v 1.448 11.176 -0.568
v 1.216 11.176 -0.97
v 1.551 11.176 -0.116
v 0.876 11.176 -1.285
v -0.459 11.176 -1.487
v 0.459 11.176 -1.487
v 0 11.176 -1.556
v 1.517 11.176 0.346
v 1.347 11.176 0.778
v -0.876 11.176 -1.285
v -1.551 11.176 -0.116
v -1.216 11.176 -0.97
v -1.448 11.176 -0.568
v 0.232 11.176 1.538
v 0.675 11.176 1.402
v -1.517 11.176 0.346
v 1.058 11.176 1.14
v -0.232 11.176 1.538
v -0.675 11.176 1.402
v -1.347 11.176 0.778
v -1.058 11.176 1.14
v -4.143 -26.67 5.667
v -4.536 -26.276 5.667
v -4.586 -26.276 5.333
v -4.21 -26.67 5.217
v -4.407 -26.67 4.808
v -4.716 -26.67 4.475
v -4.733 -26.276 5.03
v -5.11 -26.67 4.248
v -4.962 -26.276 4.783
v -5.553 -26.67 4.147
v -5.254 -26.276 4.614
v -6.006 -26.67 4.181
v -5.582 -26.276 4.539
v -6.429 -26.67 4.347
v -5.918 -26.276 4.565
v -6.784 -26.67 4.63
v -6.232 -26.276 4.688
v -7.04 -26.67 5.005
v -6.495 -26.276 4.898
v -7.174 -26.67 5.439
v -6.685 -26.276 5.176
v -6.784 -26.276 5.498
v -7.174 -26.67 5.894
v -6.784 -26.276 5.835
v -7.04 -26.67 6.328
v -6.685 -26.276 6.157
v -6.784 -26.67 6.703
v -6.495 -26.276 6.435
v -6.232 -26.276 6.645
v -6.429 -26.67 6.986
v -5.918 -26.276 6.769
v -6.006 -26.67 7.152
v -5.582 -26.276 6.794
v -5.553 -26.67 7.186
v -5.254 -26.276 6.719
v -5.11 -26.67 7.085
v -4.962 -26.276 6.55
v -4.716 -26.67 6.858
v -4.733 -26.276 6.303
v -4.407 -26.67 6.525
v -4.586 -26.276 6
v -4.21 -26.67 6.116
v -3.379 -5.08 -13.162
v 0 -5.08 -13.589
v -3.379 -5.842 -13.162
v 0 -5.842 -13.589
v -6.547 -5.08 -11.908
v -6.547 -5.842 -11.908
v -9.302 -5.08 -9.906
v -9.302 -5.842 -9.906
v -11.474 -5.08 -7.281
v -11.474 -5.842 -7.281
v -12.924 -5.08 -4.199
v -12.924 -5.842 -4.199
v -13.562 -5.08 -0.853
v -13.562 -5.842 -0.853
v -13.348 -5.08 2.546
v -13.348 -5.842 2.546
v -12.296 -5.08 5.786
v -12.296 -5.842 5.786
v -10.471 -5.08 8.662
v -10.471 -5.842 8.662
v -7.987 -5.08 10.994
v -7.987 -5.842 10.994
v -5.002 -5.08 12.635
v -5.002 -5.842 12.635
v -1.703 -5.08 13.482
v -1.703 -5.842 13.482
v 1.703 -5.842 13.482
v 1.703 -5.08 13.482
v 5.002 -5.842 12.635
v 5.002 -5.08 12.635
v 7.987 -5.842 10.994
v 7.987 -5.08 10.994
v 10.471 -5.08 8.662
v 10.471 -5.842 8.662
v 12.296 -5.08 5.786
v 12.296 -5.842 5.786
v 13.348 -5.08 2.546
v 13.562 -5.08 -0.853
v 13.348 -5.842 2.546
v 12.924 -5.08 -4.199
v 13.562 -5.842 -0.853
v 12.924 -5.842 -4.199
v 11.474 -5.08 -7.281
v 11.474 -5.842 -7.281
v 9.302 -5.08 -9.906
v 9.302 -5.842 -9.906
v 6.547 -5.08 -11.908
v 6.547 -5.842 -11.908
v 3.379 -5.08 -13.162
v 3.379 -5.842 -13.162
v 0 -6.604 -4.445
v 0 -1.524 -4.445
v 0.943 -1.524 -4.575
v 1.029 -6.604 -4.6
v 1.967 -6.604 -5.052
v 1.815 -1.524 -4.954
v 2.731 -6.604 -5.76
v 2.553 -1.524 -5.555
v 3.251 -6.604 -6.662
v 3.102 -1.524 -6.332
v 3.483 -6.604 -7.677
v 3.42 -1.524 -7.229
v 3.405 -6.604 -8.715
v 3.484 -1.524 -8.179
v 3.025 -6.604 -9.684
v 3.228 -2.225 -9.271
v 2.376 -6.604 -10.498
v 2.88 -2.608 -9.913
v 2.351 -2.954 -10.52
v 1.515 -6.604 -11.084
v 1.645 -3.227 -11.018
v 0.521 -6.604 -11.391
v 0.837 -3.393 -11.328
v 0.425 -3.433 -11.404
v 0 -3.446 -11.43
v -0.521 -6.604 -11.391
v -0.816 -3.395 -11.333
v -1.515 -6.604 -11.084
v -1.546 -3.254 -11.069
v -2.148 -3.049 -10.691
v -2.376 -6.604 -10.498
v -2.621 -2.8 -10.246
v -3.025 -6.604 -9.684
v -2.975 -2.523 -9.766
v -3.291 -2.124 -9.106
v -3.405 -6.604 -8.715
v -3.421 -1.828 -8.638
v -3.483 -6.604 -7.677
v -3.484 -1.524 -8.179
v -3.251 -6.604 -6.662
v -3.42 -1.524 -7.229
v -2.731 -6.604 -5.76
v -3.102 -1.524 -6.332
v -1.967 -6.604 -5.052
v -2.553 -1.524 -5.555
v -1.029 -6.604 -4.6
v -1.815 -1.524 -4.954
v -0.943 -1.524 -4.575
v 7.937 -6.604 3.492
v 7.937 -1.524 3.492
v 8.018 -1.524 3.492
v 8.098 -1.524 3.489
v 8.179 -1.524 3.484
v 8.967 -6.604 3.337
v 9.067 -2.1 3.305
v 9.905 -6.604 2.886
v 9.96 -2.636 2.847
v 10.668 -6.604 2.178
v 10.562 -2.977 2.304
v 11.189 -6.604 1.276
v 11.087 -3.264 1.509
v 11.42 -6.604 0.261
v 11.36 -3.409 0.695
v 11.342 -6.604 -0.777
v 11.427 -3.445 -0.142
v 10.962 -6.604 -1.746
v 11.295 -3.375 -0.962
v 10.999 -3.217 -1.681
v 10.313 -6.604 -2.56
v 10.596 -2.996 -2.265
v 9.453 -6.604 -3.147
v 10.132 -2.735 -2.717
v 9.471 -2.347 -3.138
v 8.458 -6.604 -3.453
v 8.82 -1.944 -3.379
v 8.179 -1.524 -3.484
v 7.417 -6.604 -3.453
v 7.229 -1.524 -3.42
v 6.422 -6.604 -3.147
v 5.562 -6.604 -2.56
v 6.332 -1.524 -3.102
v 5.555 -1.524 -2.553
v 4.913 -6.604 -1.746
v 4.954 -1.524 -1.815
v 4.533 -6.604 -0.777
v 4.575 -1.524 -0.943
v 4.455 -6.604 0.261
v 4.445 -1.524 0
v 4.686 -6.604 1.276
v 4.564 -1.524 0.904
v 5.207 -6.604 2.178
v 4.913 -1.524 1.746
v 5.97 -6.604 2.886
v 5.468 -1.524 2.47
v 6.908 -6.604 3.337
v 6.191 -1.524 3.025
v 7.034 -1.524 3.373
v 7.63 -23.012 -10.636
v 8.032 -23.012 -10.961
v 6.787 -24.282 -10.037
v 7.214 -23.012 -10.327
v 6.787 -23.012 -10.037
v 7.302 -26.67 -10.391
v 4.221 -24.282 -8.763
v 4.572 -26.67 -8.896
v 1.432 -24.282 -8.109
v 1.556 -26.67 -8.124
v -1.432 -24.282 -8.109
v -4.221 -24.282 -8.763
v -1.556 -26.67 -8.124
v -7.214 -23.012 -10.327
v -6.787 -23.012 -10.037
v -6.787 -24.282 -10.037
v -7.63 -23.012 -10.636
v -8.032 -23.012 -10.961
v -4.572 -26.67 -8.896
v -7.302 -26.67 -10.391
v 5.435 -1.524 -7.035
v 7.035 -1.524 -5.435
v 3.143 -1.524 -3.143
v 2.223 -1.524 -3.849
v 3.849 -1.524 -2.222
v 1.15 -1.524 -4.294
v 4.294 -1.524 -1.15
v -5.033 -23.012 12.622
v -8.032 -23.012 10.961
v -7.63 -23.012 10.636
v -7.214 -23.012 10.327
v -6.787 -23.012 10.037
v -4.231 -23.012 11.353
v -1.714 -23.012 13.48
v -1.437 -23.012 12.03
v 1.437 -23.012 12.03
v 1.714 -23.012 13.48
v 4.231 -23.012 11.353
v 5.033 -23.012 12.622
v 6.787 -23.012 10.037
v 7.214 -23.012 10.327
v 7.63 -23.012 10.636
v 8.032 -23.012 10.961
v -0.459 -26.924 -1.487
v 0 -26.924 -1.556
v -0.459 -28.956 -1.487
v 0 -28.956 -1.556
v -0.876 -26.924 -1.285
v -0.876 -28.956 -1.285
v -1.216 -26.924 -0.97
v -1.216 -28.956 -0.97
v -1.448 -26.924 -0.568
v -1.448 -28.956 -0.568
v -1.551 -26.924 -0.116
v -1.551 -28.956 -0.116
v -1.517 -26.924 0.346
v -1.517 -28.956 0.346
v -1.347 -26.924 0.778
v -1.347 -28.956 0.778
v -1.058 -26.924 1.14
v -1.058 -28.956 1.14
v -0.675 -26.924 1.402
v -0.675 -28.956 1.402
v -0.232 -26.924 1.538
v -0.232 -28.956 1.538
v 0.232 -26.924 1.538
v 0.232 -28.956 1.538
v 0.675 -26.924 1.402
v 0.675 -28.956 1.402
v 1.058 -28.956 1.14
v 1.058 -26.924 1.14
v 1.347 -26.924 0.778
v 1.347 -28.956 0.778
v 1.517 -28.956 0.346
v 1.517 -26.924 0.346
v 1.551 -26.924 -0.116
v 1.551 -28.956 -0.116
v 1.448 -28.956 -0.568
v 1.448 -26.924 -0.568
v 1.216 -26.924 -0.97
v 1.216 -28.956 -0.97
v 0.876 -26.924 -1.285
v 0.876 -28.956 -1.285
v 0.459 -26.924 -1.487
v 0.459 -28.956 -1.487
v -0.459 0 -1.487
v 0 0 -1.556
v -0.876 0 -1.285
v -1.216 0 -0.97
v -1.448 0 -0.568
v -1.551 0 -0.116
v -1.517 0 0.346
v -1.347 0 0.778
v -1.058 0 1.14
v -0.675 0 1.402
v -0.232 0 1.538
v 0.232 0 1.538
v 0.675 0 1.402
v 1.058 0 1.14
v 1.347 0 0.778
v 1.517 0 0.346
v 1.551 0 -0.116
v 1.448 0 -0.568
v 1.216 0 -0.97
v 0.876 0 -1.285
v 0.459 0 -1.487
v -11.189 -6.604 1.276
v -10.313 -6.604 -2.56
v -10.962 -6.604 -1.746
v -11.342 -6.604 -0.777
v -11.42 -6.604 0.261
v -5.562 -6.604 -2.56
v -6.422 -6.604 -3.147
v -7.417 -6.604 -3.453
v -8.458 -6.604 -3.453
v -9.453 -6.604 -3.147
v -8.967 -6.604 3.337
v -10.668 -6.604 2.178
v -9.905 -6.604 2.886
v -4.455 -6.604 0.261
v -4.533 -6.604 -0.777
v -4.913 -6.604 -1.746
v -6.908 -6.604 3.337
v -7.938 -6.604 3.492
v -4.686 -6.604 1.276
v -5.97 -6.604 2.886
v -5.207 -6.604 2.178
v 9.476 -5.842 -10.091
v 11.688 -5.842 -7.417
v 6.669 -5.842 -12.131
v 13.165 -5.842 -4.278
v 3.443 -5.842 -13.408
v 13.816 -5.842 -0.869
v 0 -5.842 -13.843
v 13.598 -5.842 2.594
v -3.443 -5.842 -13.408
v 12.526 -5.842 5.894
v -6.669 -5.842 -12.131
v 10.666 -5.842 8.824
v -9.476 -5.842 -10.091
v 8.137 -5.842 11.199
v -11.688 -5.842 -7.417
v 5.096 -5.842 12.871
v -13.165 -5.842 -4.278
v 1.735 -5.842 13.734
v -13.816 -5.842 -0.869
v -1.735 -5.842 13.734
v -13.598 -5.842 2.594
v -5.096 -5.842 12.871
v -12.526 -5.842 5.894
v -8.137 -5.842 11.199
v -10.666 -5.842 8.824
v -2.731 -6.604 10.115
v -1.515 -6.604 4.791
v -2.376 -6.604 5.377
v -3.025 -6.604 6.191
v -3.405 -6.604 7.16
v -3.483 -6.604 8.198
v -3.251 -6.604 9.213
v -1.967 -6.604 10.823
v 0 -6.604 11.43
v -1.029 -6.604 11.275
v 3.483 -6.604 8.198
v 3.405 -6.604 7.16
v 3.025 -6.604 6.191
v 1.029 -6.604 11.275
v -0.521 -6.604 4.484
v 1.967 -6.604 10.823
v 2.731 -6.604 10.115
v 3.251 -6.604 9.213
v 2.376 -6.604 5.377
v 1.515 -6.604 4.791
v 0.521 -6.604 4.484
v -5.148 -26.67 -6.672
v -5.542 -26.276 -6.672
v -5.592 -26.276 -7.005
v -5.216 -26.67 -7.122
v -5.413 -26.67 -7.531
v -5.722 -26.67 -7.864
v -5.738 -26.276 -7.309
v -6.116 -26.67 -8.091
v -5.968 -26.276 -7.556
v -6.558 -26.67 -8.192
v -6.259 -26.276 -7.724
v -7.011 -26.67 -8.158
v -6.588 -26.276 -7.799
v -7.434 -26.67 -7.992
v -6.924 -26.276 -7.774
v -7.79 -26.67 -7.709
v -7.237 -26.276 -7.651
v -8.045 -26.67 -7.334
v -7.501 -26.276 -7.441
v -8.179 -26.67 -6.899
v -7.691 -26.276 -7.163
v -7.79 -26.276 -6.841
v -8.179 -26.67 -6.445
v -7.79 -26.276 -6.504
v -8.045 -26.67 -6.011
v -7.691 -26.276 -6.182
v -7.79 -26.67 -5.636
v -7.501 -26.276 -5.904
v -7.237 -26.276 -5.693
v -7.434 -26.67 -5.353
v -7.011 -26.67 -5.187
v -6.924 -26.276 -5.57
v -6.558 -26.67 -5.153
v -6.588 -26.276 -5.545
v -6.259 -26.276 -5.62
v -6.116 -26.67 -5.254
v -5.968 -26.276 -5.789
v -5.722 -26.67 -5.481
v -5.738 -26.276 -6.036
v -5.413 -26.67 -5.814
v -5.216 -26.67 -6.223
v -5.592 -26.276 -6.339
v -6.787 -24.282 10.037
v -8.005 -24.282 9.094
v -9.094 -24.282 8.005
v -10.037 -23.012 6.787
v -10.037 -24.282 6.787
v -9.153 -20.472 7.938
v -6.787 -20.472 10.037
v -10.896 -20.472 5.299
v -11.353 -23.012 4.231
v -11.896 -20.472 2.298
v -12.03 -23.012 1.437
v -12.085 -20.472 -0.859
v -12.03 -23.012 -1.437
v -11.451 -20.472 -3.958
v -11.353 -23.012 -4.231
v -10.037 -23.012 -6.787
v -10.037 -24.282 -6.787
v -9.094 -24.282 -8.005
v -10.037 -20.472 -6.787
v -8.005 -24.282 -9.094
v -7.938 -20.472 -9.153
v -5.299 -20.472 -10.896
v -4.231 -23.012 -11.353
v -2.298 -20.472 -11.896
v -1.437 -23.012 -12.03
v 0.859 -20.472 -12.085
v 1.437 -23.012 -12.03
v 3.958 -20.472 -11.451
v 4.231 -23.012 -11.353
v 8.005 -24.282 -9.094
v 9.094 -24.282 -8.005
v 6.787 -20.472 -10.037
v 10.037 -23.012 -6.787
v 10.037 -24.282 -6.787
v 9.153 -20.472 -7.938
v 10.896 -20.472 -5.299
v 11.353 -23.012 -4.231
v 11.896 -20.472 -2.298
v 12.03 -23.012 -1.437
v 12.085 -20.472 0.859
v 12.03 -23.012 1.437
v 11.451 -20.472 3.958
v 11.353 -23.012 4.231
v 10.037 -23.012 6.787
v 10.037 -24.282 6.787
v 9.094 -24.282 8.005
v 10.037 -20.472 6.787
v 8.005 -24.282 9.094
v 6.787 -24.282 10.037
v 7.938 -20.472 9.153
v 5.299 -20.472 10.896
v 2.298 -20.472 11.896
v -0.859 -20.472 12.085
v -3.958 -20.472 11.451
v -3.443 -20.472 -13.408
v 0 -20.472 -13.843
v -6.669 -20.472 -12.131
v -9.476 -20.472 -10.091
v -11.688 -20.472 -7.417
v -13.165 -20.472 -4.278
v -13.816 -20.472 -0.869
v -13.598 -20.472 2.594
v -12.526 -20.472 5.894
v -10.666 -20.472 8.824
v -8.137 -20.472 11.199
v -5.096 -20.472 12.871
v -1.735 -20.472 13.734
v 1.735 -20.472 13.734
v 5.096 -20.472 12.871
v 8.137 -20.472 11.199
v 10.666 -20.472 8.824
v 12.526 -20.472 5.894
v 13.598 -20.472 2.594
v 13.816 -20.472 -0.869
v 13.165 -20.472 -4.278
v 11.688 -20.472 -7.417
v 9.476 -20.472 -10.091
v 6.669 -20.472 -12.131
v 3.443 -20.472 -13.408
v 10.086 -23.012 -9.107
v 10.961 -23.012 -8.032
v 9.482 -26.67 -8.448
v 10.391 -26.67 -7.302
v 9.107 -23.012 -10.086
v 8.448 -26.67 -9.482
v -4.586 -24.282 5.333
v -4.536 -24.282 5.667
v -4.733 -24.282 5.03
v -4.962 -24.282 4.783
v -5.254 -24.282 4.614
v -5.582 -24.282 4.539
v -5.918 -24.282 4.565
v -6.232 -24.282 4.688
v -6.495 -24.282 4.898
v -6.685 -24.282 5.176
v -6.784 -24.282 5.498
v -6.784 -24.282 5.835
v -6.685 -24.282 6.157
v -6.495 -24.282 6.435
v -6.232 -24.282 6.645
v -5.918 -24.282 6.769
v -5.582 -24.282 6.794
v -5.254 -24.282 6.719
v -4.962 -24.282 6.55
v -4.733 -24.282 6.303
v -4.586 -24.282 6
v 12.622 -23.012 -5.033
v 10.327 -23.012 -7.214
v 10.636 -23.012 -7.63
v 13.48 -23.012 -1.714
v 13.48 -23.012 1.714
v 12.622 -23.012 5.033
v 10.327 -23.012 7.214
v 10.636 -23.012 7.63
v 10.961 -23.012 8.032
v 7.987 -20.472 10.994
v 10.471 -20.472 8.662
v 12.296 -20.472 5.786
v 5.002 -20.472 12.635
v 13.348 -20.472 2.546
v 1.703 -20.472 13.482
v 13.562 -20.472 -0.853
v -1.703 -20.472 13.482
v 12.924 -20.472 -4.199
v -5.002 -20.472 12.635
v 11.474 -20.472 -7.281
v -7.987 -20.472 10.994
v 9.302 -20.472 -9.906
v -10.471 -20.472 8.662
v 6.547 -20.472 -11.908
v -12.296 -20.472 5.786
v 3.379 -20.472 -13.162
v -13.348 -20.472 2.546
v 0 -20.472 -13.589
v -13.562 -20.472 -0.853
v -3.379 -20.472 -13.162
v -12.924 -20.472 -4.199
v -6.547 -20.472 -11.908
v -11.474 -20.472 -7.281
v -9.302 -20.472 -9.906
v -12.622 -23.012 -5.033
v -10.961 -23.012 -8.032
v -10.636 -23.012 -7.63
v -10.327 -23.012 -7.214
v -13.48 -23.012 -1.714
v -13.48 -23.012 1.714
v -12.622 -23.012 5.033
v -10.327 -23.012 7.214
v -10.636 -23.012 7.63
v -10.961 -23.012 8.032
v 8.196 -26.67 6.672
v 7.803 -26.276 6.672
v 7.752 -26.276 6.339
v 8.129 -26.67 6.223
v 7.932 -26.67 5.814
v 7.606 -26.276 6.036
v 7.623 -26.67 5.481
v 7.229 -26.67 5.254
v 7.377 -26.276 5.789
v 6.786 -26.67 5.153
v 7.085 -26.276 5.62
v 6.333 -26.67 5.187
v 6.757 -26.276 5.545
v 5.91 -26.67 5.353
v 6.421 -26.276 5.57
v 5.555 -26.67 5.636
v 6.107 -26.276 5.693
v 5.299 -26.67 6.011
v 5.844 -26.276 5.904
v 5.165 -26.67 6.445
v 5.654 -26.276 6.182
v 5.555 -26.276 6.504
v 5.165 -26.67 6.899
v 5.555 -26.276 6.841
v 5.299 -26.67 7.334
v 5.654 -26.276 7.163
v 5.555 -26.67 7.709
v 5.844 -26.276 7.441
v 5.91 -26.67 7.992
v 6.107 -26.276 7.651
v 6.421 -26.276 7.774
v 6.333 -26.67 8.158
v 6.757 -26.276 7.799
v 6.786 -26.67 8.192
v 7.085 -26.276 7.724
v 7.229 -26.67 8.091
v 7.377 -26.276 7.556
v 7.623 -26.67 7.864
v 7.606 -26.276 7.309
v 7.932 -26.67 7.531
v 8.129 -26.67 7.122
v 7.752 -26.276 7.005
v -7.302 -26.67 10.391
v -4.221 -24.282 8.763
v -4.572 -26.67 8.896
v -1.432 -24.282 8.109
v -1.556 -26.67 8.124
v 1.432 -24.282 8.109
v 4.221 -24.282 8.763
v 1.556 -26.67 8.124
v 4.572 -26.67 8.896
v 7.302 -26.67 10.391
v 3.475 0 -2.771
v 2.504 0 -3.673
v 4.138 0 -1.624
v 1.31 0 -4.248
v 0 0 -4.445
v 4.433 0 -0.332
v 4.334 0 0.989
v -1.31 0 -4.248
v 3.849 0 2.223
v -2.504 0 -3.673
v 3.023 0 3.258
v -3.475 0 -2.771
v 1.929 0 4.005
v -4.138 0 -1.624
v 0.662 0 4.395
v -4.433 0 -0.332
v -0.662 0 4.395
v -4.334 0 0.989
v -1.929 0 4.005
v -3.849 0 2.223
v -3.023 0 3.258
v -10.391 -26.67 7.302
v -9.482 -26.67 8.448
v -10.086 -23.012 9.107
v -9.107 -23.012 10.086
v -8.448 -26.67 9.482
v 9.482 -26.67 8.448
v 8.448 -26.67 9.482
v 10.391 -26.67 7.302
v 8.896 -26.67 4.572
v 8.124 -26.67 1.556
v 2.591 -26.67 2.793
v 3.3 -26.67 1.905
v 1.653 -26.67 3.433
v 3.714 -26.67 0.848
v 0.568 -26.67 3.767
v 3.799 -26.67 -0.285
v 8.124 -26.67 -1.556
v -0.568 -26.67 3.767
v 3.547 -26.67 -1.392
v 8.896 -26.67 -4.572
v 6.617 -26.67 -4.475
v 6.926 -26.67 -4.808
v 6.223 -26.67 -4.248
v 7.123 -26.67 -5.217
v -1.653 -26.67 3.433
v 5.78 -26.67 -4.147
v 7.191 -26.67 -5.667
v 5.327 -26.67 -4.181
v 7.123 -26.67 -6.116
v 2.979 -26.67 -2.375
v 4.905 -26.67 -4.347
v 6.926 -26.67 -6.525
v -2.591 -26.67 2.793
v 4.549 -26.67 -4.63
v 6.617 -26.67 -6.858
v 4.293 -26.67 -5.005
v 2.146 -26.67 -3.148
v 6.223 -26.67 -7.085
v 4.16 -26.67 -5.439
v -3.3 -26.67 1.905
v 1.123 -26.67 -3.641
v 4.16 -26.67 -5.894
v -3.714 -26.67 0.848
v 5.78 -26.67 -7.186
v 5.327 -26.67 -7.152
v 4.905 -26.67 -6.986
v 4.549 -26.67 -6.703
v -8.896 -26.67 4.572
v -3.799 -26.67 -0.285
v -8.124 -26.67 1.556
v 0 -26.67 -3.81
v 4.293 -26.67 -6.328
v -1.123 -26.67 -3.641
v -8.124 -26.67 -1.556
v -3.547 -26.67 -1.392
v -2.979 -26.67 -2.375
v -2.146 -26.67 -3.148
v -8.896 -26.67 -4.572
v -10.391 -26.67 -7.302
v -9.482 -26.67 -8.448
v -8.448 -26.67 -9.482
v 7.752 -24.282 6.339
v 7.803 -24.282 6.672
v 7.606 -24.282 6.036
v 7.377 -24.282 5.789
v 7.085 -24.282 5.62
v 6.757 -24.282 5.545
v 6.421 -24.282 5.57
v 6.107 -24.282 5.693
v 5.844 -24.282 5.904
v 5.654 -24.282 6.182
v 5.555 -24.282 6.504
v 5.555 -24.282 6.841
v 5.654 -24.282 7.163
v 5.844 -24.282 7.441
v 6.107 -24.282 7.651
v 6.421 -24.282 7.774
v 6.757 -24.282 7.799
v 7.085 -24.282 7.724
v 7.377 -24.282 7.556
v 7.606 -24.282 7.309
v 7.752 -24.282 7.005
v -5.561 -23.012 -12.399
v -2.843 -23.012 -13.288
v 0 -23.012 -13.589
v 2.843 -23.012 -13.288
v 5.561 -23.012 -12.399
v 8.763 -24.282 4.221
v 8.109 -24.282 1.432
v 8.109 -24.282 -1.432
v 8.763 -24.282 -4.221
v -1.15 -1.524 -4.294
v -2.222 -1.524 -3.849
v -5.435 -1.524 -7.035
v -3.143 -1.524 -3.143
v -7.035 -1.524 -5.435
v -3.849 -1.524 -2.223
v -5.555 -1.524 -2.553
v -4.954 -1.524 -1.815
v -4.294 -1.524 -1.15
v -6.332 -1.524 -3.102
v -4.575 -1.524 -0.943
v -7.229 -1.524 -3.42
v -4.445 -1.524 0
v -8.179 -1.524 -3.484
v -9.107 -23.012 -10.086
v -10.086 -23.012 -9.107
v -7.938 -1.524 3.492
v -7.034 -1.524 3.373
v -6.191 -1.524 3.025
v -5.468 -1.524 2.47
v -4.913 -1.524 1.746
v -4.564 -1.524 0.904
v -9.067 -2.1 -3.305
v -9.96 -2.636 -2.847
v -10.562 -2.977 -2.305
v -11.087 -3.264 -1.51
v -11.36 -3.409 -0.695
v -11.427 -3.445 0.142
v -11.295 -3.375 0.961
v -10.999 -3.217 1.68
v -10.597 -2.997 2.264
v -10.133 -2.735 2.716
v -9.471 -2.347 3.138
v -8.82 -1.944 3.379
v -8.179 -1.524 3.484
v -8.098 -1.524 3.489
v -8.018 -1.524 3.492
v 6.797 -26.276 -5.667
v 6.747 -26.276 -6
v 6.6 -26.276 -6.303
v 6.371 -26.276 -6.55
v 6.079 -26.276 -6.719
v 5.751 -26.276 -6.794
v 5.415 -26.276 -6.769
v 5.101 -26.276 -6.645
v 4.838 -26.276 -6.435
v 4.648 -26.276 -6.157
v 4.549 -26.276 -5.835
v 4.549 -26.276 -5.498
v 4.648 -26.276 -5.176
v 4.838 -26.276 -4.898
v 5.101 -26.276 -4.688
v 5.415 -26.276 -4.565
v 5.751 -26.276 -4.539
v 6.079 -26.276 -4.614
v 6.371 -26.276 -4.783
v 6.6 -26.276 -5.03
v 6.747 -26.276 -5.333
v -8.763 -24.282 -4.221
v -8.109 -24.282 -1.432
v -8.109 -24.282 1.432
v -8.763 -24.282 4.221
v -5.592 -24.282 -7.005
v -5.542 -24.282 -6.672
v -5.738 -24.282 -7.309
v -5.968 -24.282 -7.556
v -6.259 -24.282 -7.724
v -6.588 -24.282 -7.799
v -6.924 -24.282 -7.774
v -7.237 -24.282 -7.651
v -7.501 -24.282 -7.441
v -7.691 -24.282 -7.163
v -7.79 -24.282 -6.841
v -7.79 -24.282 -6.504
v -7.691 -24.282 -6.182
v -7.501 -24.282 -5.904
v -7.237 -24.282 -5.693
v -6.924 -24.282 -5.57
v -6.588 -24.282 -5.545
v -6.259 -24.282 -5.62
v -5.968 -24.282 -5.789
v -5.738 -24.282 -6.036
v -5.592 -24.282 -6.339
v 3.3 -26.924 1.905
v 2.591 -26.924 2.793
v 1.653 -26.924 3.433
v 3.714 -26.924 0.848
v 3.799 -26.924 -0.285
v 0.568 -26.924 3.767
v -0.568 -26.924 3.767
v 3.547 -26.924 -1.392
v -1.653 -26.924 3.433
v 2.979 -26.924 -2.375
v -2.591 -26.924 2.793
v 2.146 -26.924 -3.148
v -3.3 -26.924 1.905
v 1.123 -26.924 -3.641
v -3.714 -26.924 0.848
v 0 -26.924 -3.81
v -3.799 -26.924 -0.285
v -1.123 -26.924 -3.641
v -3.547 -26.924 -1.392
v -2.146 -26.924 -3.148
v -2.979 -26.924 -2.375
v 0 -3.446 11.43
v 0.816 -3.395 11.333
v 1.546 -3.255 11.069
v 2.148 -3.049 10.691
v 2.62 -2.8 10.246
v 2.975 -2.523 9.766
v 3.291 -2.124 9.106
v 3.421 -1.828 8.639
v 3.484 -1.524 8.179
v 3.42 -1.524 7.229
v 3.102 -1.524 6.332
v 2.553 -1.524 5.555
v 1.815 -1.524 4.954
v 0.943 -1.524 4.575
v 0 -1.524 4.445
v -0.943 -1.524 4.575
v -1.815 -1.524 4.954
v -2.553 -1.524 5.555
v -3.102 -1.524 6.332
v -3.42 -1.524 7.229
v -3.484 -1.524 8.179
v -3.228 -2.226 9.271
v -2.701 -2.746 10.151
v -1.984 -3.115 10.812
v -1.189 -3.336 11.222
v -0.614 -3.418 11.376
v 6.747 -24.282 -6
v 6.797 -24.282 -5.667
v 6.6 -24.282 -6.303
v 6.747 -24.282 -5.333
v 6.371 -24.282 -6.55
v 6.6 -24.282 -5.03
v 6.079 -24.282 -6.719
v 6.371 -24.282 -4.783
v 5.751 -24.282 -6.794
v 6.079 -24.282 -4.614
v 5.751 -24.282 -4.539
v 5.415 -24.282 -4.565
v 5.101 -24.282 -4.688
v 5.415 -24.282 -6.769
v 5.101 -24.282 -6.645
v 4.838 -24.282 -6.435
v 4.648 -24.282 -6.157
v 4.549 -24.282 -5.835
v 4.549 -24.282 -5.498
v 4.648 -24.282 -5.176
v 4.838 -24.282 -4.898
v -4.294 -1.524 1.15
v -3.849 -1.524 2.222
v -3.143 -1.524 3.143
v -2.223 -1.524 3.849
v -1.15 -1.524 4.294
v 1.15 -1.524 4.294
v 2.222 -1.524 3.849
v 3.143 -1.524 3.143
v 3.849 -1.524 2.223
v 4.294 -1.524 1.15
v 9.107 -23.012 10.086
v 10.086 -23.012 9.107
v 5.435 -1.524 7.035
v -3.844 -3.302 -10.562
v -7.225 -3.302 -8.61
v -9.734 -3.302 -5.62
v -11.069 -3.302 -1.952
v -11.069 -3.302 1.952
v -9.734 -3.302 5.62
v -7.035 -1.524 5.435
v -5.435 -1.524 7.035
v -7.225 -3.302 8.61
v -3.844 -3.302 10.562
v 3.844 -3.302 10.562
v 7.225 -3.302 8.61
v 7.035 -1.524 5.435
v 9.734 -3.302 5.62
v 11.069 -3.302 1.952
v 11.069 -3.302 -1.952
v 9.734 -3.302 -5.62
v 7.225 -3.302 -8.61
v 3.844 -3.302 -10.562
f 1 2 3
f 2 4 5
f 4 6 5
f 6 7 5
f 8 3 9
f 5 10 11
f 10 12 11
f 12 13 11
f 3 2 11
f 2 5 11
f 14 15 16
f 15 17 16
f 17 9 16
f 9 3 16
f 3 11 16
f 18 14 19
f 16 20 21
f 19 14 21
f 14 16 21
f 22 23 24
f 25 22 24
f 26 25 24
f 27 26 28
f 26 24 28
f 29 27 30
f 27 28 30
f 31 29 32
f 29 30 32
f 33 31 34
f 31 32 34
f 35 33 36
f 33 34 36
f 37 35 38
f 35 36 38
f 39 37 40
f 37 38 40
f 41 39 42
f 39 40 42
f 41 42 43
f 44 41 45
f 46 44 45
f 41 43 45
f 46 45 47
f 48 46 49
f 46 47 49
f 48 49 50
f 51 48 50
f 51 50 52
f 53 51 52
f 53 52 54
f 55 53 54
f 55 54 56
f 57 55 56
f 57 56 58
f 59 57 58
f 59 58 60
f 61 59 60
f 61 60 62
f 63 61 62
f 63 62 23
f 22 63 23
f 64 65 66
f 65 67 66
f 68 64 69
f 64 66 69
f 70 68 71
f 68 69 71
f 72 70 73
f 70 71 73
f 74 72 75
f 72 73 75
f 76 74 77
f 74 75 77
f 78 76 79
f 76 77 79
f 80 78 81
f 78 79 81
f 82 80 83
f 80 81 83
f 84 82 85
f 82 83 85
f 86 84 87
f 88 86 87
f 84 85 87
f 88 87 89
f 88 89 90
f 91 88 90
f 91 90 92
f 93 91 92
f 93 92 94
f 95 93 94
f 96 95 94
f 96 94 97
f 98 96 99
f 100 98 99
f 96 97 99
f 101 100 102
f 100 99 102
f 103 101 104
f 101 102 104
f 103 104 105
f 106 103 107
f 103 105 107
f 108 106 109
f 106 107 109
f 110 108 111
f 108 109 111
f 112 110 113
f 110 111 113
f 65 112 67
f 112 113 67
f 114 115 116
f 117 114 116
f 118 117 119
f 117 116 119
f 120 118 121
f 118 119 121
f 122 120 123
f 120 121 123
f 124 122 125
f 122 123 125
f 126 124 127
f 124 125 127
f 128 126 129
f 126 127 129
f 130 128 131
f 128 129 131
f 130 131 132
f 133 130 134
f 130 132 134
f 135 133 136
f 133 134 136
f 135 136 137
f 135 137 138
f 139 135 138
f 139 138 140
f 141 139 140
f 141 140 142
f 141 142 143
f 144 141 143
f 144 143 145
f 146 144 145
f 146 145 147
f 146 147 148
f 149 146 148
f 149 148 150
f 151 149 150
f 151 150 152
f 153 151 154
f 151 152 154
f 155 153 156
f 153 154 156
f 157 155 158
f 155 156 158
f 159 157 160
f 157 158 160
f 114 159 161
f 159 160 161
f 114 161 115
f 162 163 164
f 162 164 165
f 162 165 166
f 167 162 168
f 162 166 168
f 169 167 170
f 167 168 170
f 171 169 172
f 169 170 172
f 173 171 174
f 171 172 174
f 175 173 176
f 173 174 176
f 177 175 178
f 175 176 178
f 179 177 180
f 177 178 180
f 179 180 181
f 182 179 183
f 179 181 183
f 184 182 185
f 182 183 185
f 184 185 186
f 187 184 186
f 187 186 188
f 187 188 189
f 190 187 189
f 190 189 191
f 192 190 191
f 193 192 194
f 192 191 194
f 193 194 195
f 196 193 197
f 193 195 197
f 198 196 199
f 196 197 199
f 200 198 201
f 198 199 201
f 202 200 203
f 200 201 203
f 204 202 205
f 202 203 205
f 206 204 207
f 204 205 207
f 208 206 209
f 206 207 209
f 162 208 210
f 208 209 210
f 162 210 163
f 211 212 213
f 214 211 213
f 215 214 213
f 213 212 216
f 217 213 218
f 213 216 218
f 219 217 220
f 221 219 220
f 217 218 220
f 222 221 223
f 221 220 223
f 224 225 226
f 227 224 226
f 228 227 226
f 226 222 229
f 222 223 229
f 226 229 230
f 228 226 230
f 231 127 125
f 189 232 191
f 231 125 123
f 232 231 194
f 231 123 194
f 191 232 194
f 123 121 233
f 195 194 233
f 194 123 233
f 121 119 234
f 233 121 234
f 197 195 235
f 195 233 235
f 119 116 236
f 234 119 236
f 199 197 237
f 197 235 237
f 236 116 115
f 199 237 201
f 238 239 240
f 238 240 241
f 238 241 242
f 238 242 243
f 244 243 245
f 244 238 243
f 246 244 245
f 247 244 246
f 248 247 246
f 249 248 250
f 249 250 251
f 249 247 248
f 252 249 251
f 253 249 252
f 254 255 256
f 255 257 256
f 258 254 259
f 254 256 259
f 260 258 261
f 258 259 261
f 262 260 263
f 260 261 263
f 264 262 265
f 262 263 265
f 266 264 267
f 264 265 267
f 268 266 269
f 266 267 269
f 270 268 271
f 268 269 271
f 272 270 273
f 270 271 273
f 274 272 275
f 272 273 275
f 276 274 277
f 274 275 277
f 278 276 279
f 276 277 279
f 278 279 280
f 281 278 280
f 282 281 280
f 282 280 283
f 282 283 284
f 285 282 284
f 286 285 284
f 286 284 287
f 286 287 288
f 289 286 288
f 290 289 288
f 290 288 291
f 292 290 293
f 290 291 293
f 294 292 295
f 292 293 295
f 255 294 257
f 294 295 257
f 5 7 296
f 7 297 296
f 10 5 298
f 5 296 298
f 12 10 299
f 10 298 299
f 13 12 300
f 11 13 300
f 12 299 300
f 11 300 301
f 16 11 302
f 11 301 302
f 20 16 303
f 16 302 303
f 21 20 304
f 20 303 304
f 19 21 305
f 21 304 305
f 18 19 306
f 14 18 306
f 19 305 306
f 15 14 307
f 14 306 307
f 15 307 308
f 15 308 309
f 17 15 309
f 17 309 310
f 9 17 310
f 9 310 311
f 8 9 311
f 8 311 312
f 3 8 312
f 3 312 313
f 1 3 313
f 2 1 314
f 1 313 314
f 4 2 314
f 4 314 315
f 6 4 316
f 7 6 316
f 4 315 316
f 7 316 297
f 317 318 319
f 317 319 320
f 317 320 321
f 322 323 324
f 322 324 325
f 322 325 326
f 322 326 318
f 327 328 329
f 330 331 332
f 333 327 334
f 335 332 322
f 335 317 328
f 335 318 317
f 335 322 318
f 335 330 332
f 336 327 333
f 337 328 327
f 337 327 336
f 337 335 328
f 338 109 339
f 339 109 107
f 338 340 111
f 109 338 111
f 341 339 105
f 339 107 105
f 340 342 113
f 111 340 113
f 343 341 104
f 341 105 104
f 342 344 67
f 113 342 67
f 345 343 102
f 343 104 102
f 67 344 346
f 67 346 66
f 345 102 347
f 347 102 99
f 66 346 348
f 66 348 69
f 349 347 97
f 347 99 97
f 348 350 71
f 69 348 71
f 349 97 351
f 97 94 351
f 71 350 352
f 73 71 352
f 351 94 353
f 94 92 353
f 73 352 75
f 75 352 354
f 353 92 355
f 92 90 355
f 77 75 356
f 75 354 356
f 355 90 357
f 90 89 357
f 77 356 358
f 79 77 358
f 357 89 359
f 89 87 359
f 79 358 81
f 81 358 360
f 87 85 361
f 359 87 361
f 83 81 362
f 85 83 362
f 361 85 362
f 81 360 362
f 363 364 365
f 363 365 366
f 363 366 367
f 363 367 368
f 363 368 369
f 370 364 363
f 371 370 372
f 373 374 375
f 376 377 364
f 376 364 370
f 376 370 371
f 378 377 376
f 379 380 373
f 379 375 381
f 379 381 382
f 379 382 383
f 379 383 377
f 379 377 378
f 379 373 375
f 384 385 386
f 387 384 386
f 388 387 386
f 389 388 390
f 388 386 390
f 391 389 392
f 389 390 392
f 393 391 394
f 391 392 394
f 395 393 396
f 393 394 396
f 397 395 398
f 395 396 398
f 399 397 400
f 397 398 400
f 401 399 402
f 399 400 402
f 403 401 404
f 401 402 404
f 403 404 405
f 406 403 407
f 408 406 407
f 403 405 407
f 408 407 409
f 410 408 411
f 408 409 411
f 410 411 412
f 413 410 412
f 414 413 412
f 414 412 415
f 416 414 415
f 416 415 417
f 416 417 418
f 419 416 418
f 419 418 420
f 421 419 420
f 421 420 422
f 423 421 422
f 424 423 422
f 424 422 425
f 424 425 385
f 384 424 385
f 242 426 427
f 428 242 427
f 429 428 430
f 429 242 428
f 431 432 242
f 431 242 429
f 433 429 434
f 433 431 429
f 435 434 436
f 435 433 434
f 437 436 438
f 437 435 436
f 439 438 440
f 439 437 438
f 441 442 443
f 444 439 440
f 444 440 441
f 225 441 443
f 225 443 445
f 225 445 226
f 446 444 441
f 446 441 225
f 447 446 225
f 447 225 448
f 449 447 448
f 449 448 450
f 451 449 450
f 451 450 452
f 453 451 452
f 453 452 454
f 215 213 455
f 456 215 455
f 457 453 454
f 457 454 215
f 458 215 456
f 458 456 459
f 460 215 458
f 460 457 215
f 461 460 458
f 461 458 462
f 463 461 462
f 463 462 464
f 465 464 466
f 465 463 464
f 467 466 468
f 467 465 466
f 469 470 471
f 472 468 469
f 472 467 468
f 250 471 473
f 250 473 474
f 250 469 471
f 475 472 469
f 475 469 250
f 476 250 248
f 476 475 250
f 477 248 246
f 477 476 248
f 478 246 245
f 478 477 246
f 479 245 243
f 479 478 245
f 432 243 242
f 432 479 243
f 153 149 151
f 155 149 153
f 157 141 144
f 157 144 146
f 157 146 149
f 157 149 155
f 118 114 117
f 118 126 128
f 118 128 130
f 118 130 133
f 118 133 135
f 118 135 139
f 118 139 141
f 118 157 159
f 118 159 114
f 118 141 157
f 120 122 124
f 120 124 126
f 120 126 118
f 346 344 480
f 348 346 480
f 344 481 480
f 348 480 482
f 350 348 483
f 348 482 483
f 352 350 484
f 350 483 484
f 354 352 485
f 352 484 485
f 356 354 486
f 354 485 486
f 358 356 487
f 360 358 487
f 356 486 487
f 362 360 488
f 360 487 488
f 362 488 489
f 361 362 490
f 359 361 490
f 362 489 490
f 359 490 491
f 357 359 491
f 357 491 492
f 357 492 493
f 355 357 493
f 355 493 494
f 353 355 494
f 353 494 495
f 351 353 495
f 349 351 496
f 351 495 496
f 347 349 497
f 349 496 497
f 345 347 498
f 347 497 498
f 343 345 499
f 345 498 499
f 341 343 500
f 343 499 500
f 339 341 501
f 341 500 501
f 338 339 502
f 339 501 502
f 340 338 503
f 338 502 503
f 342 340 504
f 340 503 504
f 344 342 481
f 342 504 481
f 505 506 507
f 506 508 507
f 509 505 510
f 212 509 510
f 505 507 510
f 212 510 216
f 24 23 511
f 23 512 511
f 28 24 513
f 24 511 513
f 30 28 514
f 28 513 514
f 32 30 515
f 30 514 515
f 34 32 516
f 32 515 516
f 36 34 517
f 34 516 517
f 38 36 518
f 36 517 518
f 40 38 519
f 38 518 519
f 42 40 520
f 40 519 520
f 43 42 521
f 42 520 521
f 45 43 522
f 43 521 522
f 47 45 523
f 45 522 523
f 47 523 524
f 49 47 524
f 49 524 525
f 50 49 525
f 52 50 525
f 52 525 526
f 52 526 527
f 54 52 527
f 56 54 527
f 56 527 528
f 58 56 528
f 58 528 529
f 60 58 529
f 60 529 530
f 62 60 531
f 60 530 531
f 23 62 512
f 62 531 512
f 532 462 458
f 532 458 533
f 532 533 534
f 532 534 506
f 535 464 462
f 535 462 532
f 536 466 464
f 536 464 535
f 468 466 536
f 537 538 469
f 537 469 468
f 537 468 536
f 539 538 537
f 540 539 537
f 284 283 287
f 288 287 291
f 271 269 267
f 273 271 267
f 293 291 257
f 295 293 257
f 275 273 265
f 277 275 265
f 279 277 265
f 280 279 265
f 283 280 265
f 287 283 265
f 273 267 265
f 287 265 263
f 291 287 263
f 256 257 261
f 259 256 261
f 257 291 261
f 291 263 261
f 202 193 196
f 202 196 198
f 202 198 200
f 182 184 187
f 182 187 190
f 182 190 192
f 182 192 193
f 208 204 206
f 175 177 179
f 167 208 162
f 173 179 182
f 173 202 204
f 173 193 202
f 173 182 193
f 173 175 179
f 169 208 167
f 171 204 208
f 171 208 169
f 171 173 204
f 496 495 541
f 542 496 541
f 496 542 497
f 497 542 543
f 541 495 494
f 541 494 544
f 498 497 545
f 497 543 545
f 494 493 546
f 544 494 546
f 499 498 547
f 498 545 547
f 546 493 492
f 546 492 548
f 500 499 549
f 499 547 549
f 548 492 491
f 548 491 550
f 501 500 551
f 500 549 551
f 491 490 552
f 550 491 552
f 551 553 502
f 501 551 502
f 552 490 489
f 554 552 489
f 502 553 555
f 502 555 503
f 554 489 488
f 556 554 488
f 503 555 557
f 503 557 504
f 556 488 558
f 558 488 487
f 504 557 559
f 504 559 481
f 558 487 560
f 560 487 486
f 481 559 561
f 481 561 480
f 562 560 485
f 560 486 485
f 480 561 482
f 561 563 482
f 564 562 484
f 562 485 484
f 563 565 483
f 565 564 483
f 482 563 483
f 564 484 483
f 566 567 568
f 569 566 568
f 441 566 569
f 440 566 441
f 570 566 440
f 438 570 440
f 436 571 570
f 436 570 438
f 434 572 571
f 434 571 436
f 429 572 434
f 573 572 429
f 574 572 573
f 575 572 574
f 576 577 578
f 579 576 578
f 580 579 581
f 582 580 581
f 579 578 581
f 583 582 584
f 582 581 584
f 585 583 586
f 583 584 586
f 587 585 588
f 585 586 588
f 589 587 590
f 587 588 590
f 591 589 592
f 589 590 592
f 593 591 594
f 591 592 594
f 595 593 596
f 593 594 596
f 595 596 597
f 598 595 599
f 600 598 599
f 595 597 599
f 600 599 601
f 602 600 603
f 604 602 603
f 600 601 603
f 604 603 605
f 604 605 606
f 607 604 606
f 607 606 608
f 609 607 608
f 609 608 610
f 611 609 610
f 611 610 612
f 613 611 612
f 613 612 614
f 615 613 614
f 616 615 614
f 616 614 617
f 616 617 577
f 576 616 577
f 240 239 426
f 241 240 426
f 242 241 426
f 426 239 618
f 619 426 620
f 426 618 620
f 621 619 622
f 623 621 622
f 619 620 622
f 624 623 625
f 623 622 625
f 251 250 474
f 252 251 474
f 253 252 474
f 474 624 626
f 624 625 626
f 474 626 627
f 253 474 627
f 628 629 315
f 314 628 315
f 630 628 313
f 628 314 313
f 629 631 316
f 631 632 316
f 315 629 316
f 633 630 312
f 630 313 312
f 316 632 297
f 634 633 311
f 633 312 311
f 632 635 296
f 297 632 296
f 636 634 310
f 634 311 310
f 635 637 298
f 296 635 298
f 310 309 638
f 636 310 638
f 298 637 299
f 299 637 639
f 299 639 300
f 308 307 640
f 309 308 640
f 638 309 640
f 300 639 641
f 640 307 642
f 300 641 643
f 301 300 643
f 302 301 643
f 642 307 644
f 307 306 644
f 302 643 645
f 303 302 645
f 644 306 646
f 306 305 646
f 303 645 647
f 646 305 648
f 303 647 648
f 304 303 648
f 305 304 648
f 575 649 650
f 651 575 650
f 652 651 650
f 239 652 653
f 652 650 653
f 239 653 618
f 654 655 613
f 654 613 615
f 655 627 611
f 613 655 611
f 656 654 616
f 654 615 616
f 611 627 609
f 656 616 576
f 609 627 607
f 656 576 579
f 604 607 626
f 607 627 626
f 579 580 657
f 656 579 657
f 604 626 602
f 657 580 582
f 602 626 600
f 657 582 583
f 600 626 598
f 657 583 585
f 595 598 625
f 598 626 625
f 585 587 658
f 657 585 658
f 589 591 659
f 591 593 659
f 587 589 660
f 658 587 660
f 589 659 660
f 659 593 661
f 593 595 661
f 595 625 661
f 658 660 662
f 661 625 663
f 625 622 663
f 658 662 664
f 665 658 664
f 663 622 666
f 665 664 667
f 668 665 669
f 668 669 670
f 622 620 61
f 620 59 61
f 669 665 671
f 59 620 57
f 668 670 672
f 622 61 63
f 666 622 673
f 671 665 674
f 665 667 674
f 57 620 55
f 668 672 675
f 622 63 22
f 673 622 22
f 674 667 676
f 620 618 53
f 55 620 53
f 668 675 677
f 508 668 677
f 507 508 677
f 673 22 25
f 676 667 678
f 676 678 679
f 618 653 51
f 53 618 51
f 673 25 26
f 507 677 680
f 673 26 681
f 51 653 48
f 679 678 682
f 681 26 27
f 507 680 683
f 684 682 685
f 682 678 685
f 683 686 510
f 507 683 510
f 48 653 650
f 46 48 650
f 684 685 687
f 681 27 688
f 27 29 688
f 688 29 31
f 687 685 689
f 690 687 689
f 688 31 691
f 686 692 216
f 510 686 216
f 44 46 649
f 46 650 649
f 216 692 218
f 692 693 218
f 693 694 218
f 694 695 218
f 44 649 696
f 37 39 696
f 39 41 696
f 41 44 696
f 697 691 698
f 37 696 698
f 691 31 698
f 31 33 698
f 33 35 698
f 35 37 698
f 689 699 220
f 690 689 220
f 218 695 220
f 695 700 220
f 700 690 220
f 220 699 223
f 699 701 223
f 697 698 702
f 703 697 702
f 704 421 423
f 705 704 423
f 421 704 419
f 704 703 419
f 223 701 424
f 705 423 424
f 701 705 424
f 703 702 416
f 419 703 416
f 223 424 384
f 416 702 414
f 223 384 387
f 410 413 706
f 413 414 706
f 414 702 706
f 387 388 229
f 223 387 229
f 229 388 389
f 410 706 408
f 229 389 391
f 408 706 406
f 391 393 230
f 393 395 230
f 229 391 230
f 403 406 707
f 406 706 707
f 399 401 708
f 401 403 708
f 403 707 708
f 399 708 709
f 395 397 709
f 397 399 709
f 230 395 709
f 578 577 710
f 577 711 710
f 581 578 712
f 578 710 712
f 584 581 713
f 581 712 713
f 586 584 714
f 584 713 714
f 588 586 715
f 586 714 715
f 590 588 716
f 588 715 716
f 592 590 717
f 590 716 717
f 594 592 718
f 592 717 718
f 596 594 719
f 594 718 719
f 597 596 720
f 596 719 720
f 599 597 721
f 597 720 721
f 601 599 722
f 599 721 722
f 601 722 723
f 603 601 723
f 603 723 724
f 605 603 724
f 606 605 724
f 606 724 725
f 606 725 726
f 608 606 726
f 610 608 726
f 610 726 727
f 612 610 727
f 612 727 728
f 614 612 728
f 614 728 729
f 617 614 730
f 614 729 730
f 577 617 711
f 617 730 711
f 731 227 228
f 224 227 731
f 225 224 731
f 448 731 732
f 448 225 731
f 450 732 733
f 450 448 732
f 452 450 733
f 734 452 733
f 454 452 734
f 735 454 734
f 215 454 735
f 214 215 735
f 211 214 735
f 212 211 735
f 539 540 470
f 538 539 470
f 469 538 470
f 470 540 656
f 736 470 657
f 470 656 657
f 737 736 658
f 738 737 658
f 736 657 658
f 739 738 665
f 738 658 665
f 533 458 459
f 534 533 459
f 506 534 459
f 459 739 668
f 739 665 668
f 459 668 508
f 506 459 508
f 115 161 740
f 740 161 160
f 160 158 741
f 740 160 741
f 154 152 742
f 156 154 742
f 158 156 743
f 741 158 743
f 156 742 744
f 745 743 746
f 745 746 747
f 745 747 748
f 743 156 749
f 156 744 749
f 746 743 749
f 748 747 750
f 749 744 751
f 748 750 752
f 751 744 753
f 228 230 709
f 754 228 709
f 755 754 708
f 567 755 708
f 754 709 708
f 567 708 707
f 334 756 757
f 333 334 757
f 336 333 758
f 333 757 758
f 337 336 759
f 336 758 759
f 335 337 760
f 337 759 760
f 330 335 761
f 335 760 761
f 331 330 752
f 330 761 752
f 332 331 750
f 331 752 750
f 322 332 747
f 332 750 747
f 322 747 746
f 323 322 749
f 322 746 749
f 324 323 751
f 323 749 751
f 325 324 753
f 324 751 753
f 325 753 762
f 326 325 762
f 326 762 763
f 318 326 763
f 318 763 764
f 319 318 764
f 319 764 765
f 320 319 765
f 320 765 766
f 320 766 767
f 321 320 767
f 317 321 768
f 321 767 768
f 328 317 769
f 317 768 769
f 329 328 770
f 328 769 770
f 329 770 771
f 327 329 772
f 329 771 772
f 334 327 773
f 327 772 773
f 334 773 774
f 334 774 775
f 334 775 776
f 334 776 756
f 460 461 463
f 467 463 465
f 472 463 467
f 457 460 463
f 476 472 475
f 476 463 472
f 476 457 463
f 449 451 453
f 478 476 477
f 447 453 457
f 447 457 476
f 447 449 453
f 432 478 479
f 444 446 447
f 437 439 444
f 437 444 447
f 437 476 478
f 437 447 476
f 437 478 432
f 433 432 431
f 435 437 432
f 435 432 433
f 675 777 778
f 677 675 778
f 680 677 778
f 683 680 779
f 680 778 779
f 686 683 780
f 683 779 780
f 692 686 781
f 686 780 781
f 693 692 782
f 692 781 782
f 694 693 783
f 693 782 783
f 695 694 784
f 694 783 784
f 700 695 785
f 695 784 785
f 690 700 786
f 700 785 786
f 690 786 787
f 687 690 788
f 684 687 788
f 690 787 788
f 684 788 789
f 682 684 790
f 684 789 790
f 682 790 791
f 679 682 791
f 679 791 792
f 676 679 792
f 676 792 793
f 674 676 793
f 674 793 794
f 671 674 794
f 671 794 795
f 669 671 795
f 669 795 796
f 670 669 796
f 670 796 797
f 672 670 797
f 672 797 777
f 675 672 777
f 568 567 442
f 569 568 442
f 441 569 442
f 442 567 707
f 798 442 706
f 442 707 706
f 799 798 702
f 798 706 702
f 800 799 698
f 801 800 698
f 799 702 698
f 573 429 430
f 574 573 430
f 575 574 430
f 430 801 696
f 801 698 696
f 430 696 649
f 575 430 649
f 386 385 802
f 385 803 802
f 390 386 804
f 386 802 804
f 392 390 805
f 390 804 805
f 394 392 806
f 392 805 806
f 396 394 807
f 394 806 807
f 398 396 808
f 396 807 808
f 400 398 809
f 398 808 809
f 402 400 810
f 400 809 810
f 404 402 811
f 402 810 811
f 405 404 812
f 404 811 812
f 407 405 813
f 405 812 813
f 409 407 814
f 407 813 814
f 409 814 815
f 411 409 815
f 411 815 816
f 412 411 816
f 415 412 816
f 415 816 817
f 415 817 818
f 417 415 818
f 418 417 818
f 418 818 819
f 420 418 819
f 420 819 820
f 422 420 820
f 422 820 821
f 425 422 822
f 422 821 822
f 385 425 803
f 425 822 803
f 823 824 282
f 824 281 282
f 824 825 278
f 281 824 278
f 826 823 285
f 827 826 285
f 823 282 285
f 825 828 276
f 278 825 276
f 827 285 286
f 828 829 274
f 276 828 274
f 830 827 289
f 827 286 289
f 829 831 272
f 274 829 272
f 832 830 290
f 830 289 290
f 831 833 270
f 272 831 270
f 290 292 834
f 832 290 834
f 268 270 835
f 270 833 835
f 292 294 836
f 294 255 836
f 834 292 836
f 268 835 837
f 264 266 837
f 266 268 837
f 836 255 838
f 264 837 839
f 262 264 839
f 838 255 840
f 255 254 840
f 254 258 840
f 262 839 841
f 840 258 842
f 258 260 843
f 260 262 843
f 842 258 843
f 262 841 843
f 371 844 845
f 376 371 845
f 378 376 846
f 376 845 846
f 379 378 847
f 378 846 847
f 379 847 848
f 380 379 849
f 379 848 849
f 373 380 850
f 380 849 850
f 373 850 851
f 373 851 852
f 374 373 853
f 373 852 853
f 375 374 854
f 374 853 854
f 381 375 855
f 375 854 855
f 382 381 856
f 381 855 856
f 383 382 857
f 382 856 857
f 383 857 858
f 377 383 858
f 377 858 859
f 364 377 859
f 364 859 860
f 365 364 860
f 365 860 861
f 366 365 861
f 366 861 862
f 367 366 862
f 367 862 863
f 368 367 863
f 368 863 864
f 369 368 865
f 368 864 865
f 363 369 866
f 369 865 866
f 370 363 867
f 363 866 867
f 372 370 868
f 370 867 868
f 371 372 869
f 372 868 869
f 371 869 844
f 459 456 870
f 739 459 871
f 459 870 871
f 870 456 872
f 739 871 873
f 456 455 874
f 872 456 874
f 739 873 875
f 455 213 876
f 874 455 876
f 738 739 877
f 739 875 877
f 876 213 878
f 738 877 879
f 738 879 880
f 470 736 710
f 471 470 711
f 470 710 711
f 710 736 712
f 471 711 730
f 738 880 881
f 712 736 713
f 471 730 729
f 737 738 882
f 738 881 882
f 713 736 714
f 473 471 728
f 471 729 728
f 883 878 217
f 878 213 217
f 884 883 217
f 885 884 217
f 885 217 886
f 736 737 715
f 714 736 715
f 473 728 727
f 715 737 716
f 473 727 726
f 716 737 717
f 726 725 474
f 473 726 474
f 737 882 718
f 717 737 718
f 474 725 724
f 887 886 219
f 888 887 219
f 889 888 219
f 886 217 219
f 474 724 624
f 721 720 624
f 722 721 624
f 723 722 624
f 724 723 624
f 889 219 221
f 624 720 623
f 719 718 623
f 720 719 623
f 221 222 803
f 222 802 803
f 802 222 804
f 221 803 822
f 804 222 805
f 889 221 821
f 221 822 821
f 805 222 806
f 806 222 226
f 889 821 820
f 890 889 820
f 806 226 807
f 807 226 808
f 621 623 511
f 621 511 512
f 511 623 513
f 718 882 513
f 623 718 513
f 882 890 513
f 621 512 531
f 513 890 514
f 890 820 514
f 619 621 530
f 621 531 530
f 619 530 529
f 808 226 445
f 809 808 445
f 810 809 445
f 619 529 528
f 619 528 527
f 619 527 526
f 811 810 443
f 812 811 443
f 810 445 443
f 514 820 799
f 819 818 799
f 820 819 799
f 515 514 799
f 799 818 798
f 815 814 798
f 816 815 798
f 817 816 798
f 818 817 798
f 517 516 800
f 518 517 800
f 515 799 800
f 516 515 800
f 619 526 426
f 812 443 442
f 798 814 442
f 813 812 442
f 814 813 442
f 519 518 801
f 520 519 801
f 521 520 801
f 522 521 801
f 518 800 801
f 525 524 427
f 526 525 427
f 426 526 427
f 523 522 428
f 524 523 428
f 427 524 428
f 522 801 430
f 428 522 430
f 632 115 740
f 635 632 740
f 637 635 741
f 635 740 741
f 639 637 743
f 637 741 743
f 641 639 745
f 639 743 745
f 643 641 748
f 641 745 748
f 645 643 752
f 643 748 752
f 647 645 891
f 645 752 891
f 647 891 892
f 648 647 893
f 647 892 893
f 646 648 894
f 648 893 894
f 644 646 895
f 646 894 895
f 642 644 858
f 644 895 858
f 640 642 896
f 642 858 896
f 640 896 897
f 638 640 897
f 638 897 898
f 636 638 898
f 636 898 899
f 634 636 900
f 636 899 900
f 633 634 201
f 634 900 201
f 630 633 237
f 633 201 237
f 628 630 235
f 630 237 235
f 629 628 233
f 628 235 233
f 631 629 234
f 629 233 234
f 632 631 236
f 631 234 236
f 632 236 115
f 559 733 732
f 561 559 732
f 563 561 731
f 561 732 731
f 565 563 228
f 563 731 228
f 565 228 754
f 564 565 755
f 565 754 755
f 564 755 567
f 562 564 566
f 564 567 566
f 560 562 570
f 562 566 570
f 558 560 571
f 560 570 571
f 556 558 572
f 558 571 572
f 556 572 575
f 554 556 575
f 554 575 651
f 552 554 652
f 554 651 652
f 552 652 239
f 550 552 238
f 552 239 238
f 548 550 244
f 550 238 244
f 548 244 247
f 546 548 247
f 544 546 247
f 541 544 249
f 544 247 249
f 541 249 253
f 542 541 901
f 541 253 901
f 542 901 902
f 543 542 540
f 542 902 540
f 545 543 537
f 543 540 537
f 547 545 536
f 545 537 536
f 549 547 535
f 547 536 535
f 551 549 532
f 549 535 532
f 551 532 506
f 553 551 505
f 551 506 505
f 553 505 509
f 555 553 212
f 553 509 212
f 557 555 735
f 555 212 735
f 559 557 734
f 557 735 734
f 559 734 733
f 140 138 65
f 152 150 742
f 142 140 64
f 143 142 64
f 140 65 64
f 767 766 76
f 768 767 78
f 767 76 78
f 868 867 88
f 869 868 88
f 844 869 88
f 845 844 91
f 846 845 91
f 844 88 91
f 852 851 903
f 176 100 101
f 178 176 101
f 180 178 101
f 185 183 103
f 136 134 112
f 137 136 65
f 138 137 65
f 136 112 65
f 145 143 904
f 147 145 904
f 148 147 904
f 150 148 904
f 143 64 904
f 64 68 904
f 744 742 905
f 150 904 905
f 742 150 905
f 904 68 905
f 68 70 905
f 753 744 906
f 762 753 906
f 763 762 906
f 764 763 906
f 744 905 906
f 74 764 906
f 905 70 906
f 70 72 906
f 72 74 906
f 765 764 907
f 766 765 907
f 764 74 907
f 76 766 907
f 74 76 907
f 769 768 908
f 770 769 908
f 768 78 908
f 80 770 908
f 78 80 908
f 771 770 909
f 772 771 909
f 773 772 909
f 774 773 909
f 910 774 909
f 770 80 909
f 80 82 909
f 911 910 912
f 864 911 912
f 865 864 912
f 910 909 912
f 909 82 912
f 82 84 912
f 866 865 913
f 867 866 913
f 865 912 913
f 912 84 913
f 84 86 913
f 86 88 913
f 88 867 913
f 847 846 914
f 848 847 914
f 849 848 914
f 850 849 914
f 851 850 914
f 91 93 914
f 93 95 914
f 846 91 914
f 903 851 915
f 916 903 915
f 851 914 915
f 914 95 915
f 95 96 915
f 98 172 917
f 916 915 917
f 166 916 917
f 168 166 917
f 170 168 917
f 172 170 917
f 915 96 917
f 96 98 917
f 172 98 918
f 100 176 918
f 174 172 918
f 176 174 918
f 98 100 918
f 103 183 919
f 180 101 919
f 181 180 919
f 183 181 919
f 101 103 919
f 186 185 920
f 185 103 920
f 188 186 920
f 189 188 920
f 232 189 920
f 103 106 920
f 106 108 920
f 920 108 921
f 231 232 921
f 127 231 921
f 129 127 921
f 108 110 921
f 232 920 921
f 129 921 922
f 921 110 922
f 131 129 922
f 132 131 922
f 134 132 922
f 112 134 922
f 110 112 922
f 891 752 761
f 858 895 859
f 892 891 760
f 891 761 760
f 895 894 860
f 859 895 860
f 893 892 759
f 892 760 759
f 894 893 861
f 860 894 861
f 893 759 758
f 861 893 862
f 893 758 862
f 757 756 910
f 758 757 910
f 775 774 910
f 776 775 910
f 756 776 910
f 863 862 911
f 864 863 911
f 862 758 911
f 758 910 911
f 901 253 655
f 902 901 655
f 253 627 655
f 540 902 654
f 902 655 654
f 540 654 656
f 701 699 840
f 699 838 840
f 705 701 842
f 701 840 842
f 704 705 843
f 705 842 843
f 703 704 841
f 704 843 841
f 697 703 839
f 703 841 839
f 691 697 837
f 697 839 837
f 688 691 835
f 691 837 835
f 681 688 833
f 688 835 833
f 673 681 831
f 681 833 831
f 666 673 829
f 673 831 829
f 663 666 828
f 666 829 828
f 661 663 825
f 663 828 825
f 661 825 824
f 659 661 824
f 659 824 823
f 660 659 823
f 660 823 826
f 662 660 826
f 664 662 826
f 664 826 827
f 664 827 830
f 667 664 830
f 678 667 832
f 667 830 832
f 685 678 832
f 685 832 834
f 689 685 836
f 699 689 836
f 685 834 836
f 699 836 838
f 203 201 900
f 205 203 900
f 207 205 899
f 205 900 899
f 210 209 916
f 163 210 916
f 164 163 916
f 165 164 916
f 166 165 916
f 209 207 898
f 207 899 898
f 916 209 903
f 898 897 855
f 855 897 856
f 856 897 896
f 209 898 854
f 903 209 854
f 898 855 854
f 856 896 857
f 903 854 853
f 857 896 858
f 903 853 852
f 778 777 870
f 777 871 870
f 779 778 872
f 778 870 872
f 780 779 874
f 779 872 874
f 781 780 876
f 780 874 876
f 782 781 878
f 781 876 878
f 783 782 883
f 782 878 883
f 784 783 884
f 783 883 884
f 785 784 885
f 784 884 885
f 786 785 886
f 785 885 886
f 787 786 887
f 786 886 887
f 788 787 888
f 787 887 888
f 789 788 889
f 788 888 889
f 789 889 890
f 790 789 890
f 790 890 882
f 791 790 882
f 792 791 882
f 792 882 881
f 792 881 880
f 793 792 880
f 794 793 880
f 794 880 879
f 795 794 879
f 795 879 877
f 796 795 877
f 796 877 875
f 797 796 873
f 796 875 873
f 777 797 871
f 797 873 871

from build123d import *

# Parameters (mm, degrees)
SKETCH2_R                       = 3.4925
CUT_EXTRUDE1_DEPTH              = 5.08
SKETCH3_R                       = 12.460238567
CUT_EXTRUDE2_DEPTH              = 3.6576
CUT_EXTRUDE3_DEPTH              = 1.27
CUT_EXTRUDE3_DEPTH_BACK         = 2.54
SKETCH4_R                       = 12.1158
F_4_40_TAPPED_HOLE1_D           = 2.2606
F_4_40_TAPPED_HOLE1_DEPTH       = 2.54
F_4_40_TAPPED_HOLE1_CSINK_D     = 3.048
F_4_40_TAPPED_HOLE1_CSINK_ANGLE = 90
F_4_40_TAPPED_HOLE1_TIP         = 0.679152758


with BuildPart() as part:
    # Sketch1 → Revolve1 (revolve)
    with BuildSketch(Plane.XY, mode=Mode.PRIVATE) as revolve1_sk:
        Polygon((0, 11.176), (1.55575, 11.176), (1.55575, 0), (4.445, 0), (4.445, -1.524), (8.89, -1.524), (13.589, -5.08), (13.589, -5.842), (13.843, -5.842), (13.843, -20.4724), (13.589, -20.4724), (13.589, -23.0124), (12.7, -26.67), (3.81, -26.67), (3.81, -26.924), (1.55575, -26.924), (1.55575, -28.956), (0, -28.956), align=None)
    revolve(revolve1_sk.sketch.rotate(Axis((0, -28.956, 0), (0, 1, 0)), 90), axis=Axis((0, -28.956, 0), (0, 1, 0)))

    # Sketch2 → Cut-Extrude1 (cut)
    with BuildSketch(Plane(origin=(0, -1.524, 0), x_dir=(1, 0, 0), z_dir=(0, 1, 0))):
        with Locations(Location((0, 7.9375, 0), (0, 0, 270))):
            Circle(SKETCH2_R)
        with Locations(Location((7.9375, 0, 0), (0, 0, 270))):
            Circle(SKETCH2_R)
        with Locations(Location((0, -7.9375, 0), (0, 0, 270))):
            Circle(SKETCH2_R)
        with Locations(Location((-7.9375, 0, 0), (0, 0, 270))):
            Circle(SKETCH2_R)
    extrude(amount=-CUT_EXTRUDE1_DEPTH, mode=Mode.SUBTRACT)

    # Sketch3 → Cut-Extrude2 (cut)
    with BuildSketch(Plane.XZ.offset(26.67)):
        with Locations((0, 20.486638567)):
            Circle(SKETCH3_R)
        with Locations((-20.486638567, 0)):
            Circle(SKETCH3_R)
        with Locations((0, -20.486638567)):
            Circle(SKETCH3_R)
        with Locations((20.486638567, 0)):
            Circle(SKETCH3_R)
    extrude(amount=-CUT_EXTRUDE2_DEPTH, mode=Mode.SUBTRACT)

    # Sketch4 → Cut-Extrude3 (cut, two sides: drawn at the far end of the back side and taken through both)
    with BuildSketch(Plane.XZ.offset(23.0124).offset(-CUT_EXTRUDE3_DEPTH_BACK)):
        with Locations(Location((0, 0, 0), (0, 0, 124.065321666))):
            Circle(SKETCH4_R)
    extrude(amount=CUT_EXTRUDE3_DEPTH + CUT_EXTRUDE3_DEPTH_BACK, mode=Mode.SUBTRACT)

    # #4-40 Tapped Hole1
    with Locations(Plane(origin=(0, -26.67, 0), x_dir=(-1, 0, 0), z_dir=(0, -1, 0))):
        with Locations((5.666541612, -5.666541612), (-6.672330298, -6.672330298), (-5.666541612, 5.666541612), (6.672330298, 6.672330298)):
            CounterSinkHole(F_4_40_TAPPED_HOLE1_D / 2, F_4_40_TAPPED_HOLE1_CSINK_D / 2, depth=F_4_40_TAPPED_HOLE1_DEPTH, counter_sink_angle=F_4_40_TAPPED_HOLE1_CSINK_ANGLE)
            with Locations((0, 0, -(F_4_40_TAPPED_HOLE1_DEPTH + F_4_40_TAPPED_HOLE1_TIP / 2))):  # 118° drill point
                Cone(0, F_4_40_TAPPED_HOLE1_D / 2, F_4_40_TAPPED_HOLE1_TIP, mode=Mode.SUBTRACT)


solid = part.part
